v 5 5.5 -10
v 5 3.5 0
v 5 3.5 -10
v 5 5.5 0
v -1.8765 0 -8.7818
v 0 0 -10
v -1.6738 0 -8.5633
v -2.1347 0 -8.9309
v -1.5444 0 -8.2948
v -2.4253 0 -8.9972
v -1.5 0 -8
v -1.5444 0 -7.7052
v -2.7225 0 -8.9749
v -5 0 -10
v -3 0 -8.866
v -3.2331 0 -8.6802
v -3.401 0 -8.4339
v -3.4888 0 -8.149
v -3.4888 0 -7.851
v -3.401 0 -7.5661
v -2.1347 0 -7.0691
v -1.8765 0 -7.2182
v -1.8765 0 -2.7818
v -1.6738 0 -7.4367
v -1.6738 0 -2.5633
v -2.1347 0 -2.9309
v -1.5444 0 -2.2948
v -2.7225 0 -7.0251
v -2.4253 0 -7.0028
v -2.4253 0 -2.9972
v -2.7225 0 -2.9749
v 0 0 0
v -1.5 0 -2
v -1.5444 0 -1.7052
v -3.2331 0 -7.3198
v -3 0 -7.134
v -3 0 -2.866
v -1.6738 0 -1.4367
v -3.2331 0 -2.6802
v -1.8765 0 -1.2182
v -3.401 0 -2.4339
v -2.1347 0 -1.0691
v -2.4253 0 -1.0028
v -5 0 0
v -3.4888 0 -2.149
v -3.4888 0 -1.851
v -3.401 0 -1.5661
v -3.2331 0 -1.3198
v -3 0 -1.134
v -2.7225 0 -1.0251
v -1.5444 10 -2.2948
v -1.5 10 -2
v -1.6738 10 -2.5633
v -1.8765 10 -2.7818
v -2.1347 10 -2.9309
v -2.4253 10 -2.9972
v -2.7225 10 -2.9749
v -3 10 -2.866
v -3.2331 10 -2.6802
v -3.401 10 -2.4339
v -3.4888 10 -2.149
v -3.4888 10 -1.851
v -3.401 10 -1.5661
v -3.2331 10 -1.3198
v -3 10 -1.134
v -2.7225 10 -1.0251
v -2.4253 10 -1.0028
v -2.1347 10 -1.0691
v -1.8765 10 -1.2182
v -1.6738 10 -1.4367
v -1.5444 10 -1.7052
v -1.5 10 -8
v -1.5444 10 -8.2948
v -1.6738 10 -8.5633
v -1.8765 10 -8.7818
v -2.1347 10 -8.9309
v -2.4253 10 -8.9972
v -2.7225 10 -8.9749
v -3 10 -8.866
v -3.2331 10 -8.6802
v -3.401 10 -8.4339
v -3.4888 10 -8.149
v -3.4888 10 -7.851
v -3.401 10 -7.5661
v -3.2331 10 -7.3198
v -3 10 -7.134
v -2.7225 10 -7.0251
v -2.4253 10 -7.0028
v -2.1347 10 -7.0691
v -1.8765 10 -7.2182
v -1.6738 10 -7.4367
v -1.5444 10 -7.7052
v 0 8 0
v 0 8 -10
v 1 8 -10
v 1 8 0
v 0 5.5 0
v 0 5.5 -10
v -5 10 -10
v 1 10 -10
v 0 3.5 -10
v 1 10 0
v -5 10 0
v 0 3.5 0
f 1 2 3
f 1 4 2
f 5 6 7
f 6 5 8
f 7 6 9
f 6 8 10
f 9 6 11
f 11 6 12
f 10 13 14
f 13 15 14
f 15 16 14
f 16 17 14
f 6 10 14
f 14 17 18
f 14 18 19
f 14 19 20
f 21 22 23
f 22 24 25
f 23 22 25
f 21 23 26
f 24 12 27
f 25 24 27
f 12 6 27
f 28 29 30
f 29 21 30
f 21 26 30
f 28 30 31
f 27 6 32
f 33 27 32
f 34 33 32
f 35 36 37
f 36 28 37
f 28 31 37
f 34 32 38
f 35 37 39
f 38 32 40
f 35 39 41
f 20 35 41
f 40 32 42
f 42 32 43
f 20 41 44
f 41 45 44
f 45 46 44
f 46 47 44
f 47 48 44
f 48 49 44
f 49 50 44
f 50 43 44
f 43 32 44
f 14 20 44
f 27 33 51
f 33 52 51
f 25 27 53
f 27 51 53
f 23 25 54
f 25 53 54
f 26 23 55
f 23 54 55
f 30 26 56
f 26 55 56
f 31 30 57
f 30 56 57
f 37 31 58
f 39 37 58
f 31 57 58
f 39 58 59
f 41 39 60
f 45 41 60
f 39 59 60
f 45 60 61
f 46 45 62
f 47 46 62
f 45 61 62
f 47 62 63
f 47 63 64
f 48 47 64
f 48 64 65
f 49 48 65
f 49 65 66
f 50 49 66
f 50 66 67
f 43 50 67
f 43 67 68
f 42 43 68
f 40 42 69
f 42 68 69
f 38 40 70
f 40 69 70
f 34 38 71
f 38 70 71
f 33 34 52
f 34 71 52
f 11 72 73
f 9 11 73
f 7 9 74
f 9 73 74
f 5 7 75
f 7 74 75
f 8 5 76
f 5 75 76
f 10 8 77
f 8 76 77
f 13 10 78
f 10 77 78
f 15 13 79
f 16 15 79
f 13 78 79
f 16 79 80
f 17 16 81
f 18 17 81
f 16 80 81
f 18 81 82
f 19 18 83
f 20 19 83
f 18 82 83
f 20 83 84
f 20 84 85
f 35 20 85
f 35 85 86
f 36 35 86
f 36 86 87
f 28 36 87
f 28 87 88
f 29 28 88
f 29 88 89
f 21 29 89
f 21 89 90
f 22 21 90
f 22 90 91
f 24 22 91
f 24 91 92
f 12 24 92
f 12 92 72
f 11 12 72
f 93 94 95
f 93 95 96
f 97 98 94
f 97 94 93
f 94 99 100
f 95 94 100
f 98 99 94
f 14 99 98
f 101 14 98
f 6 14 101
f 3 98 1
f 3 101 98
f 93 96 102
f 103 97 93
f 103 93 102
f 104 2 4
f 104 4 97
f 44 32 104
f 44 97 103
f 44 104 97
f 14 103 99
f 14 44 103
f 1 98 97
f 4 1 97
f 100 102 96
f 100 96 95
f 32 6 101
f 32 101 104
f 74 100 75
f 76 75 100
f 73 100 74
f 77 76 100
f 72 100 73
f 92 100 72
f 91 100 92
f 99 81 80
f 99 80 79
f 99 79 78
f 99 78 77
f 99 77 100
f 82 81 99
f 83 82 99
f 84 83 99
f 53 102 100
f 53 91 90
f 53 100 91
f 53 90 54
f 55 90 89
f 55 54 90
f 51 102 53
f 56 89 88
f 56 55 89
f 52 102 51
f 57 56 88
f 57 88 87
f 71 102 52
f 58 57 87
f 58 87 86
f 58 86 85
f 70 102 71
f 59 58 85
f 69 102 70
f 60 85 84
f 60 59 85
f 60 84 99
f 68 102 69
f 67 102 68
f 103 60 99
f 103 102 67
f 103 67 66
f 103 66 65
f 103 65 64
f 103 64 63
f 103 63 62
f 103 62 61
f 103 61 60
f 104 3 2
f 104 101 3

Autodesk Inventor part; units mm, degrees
ref_plane "YZ Plane" through (0, 0, 0) normal (1, 0, 0) x (0, 1, 0)
ref_plane "XZ Plane" through (0, 0, 0) normal (0, 1, 0) x (-1, 0, 0)
ref_plane "XY Plane" through (0, 0, 0) normal (0, 0, 1) x (1, 0, 0)
sketch "Sketch1" plane through (0, 0, 0) normal (0, 1, 0) x (-1, 0, 0)
  line L0 (0, 0) -> (5, 0)
  line L1 (5, 0) -> (5, -10)
  line L2 (5, -10) -> (0, -10)
  line L3 (0, -10) -> (0, 0)
  dimension "d0" = 5
  dimension "d1" = 10
extrude "Extrusion1" add sketch "Sketch1" along normal blind 10
sketch "Sketch2" plane through (0, 0, 0) normal (1, 0, 0) x (0, 0, -1)
  line L0 (10, 10) -> (0, 10) projected
  line L1 (10, 0) -> (10, 10) projected
  line L2 (0, 10) -> (10, 10)
  line L3 (10, 10) -> (10, 8)
  line L4 (10, 8) -> (0, 8)
  line L5 (0, 8) -> (0, 10)
  line L6 (0, 8) -> (10, 8)
  line L7 (10, 8) -> (10, 5.5)
  line L8 (10, 5.5) -> (0, 5.5)
  line L9 (0, 5.5) -> (0, 8)
  line L10 (0, 5.5) -> (10, 5.5)
  line L11 (10, 5.5) -> (10, 3.5)
  line L12 (10, 3.5) -> (0, 3.5)
  line L13 (0, 3.5) -> (0, 5.5)
  point P0 (0, 0)
  dimension "d4" = 2
  dimension "d5" = 2.5
  dimension "d6" = 2
extrude "Extrusion2" add sketch "Sketch2" along normal blind 5 contours L1 L4 L5 L0 | L1 L12 L13 L8
sketch "Sketch3" plane through (0, 10, 0) normal (0, 1, 0) x (1, 0, 0)
  line L0 (-5, 10) -> (-5, 0) projected
  line L1 (-5, 0) -> (-2.5, 0)
  line L2 (-2.5, 0) -> (-2.5, 2)
  line L3 (-2.5, 2) -> (-5, 2)
  line L4 (-5, 2) -> (-5, 0)
  line L5 (0, 10) -> (-5, 10) projected
  line L6 (-5, 10) -> (-2.5, 10)
  line L7 (-2.5, 10) -> (-2.5, 8)
  line L8 (-2.5, 8) -> (-5, 8)
  line L9 (-5, 8) -> (-5, 10)
  circle A0 centre (-2.5, 2) radius 1
  circle A1 centre (-2.5, 8) radius 1
  point P0 (0, 0)
  dimension "d9" = 2.5
  dimension "d10" = 2
  dimension "d11" = 2.5
  dimension "d12" = 2
  dimension "d13" = 2
  dimension "d14" = 2
extrude "Extrusion3" cut sketch "Sketch3" against normal blind 20 contours A1 L7 L8 | L8 L7 A1 | A0 L2 L3 | L3 L2 A0
sketch "Sketch4" plane through (5, 0, 0) normal (1, 0, 0) x (0, 0, -1)
  line L0 (0, 10) -> (0, 8) projected
  line L1 (0, 8) -> (10, 8) projected
  line L2 (0, 10) -> (10, 10)
  line L3 (10, 10) -> (10, 8)
  line L4 (10, 8) -> (0, 8)
  line L5 (0, 8) -> (0, 10)
  point P0 (0, 0)
extrude "Extrusion4" cut sketch "Sketch4" against normal blind 4
properties part number "suport1_pcb_temp"
